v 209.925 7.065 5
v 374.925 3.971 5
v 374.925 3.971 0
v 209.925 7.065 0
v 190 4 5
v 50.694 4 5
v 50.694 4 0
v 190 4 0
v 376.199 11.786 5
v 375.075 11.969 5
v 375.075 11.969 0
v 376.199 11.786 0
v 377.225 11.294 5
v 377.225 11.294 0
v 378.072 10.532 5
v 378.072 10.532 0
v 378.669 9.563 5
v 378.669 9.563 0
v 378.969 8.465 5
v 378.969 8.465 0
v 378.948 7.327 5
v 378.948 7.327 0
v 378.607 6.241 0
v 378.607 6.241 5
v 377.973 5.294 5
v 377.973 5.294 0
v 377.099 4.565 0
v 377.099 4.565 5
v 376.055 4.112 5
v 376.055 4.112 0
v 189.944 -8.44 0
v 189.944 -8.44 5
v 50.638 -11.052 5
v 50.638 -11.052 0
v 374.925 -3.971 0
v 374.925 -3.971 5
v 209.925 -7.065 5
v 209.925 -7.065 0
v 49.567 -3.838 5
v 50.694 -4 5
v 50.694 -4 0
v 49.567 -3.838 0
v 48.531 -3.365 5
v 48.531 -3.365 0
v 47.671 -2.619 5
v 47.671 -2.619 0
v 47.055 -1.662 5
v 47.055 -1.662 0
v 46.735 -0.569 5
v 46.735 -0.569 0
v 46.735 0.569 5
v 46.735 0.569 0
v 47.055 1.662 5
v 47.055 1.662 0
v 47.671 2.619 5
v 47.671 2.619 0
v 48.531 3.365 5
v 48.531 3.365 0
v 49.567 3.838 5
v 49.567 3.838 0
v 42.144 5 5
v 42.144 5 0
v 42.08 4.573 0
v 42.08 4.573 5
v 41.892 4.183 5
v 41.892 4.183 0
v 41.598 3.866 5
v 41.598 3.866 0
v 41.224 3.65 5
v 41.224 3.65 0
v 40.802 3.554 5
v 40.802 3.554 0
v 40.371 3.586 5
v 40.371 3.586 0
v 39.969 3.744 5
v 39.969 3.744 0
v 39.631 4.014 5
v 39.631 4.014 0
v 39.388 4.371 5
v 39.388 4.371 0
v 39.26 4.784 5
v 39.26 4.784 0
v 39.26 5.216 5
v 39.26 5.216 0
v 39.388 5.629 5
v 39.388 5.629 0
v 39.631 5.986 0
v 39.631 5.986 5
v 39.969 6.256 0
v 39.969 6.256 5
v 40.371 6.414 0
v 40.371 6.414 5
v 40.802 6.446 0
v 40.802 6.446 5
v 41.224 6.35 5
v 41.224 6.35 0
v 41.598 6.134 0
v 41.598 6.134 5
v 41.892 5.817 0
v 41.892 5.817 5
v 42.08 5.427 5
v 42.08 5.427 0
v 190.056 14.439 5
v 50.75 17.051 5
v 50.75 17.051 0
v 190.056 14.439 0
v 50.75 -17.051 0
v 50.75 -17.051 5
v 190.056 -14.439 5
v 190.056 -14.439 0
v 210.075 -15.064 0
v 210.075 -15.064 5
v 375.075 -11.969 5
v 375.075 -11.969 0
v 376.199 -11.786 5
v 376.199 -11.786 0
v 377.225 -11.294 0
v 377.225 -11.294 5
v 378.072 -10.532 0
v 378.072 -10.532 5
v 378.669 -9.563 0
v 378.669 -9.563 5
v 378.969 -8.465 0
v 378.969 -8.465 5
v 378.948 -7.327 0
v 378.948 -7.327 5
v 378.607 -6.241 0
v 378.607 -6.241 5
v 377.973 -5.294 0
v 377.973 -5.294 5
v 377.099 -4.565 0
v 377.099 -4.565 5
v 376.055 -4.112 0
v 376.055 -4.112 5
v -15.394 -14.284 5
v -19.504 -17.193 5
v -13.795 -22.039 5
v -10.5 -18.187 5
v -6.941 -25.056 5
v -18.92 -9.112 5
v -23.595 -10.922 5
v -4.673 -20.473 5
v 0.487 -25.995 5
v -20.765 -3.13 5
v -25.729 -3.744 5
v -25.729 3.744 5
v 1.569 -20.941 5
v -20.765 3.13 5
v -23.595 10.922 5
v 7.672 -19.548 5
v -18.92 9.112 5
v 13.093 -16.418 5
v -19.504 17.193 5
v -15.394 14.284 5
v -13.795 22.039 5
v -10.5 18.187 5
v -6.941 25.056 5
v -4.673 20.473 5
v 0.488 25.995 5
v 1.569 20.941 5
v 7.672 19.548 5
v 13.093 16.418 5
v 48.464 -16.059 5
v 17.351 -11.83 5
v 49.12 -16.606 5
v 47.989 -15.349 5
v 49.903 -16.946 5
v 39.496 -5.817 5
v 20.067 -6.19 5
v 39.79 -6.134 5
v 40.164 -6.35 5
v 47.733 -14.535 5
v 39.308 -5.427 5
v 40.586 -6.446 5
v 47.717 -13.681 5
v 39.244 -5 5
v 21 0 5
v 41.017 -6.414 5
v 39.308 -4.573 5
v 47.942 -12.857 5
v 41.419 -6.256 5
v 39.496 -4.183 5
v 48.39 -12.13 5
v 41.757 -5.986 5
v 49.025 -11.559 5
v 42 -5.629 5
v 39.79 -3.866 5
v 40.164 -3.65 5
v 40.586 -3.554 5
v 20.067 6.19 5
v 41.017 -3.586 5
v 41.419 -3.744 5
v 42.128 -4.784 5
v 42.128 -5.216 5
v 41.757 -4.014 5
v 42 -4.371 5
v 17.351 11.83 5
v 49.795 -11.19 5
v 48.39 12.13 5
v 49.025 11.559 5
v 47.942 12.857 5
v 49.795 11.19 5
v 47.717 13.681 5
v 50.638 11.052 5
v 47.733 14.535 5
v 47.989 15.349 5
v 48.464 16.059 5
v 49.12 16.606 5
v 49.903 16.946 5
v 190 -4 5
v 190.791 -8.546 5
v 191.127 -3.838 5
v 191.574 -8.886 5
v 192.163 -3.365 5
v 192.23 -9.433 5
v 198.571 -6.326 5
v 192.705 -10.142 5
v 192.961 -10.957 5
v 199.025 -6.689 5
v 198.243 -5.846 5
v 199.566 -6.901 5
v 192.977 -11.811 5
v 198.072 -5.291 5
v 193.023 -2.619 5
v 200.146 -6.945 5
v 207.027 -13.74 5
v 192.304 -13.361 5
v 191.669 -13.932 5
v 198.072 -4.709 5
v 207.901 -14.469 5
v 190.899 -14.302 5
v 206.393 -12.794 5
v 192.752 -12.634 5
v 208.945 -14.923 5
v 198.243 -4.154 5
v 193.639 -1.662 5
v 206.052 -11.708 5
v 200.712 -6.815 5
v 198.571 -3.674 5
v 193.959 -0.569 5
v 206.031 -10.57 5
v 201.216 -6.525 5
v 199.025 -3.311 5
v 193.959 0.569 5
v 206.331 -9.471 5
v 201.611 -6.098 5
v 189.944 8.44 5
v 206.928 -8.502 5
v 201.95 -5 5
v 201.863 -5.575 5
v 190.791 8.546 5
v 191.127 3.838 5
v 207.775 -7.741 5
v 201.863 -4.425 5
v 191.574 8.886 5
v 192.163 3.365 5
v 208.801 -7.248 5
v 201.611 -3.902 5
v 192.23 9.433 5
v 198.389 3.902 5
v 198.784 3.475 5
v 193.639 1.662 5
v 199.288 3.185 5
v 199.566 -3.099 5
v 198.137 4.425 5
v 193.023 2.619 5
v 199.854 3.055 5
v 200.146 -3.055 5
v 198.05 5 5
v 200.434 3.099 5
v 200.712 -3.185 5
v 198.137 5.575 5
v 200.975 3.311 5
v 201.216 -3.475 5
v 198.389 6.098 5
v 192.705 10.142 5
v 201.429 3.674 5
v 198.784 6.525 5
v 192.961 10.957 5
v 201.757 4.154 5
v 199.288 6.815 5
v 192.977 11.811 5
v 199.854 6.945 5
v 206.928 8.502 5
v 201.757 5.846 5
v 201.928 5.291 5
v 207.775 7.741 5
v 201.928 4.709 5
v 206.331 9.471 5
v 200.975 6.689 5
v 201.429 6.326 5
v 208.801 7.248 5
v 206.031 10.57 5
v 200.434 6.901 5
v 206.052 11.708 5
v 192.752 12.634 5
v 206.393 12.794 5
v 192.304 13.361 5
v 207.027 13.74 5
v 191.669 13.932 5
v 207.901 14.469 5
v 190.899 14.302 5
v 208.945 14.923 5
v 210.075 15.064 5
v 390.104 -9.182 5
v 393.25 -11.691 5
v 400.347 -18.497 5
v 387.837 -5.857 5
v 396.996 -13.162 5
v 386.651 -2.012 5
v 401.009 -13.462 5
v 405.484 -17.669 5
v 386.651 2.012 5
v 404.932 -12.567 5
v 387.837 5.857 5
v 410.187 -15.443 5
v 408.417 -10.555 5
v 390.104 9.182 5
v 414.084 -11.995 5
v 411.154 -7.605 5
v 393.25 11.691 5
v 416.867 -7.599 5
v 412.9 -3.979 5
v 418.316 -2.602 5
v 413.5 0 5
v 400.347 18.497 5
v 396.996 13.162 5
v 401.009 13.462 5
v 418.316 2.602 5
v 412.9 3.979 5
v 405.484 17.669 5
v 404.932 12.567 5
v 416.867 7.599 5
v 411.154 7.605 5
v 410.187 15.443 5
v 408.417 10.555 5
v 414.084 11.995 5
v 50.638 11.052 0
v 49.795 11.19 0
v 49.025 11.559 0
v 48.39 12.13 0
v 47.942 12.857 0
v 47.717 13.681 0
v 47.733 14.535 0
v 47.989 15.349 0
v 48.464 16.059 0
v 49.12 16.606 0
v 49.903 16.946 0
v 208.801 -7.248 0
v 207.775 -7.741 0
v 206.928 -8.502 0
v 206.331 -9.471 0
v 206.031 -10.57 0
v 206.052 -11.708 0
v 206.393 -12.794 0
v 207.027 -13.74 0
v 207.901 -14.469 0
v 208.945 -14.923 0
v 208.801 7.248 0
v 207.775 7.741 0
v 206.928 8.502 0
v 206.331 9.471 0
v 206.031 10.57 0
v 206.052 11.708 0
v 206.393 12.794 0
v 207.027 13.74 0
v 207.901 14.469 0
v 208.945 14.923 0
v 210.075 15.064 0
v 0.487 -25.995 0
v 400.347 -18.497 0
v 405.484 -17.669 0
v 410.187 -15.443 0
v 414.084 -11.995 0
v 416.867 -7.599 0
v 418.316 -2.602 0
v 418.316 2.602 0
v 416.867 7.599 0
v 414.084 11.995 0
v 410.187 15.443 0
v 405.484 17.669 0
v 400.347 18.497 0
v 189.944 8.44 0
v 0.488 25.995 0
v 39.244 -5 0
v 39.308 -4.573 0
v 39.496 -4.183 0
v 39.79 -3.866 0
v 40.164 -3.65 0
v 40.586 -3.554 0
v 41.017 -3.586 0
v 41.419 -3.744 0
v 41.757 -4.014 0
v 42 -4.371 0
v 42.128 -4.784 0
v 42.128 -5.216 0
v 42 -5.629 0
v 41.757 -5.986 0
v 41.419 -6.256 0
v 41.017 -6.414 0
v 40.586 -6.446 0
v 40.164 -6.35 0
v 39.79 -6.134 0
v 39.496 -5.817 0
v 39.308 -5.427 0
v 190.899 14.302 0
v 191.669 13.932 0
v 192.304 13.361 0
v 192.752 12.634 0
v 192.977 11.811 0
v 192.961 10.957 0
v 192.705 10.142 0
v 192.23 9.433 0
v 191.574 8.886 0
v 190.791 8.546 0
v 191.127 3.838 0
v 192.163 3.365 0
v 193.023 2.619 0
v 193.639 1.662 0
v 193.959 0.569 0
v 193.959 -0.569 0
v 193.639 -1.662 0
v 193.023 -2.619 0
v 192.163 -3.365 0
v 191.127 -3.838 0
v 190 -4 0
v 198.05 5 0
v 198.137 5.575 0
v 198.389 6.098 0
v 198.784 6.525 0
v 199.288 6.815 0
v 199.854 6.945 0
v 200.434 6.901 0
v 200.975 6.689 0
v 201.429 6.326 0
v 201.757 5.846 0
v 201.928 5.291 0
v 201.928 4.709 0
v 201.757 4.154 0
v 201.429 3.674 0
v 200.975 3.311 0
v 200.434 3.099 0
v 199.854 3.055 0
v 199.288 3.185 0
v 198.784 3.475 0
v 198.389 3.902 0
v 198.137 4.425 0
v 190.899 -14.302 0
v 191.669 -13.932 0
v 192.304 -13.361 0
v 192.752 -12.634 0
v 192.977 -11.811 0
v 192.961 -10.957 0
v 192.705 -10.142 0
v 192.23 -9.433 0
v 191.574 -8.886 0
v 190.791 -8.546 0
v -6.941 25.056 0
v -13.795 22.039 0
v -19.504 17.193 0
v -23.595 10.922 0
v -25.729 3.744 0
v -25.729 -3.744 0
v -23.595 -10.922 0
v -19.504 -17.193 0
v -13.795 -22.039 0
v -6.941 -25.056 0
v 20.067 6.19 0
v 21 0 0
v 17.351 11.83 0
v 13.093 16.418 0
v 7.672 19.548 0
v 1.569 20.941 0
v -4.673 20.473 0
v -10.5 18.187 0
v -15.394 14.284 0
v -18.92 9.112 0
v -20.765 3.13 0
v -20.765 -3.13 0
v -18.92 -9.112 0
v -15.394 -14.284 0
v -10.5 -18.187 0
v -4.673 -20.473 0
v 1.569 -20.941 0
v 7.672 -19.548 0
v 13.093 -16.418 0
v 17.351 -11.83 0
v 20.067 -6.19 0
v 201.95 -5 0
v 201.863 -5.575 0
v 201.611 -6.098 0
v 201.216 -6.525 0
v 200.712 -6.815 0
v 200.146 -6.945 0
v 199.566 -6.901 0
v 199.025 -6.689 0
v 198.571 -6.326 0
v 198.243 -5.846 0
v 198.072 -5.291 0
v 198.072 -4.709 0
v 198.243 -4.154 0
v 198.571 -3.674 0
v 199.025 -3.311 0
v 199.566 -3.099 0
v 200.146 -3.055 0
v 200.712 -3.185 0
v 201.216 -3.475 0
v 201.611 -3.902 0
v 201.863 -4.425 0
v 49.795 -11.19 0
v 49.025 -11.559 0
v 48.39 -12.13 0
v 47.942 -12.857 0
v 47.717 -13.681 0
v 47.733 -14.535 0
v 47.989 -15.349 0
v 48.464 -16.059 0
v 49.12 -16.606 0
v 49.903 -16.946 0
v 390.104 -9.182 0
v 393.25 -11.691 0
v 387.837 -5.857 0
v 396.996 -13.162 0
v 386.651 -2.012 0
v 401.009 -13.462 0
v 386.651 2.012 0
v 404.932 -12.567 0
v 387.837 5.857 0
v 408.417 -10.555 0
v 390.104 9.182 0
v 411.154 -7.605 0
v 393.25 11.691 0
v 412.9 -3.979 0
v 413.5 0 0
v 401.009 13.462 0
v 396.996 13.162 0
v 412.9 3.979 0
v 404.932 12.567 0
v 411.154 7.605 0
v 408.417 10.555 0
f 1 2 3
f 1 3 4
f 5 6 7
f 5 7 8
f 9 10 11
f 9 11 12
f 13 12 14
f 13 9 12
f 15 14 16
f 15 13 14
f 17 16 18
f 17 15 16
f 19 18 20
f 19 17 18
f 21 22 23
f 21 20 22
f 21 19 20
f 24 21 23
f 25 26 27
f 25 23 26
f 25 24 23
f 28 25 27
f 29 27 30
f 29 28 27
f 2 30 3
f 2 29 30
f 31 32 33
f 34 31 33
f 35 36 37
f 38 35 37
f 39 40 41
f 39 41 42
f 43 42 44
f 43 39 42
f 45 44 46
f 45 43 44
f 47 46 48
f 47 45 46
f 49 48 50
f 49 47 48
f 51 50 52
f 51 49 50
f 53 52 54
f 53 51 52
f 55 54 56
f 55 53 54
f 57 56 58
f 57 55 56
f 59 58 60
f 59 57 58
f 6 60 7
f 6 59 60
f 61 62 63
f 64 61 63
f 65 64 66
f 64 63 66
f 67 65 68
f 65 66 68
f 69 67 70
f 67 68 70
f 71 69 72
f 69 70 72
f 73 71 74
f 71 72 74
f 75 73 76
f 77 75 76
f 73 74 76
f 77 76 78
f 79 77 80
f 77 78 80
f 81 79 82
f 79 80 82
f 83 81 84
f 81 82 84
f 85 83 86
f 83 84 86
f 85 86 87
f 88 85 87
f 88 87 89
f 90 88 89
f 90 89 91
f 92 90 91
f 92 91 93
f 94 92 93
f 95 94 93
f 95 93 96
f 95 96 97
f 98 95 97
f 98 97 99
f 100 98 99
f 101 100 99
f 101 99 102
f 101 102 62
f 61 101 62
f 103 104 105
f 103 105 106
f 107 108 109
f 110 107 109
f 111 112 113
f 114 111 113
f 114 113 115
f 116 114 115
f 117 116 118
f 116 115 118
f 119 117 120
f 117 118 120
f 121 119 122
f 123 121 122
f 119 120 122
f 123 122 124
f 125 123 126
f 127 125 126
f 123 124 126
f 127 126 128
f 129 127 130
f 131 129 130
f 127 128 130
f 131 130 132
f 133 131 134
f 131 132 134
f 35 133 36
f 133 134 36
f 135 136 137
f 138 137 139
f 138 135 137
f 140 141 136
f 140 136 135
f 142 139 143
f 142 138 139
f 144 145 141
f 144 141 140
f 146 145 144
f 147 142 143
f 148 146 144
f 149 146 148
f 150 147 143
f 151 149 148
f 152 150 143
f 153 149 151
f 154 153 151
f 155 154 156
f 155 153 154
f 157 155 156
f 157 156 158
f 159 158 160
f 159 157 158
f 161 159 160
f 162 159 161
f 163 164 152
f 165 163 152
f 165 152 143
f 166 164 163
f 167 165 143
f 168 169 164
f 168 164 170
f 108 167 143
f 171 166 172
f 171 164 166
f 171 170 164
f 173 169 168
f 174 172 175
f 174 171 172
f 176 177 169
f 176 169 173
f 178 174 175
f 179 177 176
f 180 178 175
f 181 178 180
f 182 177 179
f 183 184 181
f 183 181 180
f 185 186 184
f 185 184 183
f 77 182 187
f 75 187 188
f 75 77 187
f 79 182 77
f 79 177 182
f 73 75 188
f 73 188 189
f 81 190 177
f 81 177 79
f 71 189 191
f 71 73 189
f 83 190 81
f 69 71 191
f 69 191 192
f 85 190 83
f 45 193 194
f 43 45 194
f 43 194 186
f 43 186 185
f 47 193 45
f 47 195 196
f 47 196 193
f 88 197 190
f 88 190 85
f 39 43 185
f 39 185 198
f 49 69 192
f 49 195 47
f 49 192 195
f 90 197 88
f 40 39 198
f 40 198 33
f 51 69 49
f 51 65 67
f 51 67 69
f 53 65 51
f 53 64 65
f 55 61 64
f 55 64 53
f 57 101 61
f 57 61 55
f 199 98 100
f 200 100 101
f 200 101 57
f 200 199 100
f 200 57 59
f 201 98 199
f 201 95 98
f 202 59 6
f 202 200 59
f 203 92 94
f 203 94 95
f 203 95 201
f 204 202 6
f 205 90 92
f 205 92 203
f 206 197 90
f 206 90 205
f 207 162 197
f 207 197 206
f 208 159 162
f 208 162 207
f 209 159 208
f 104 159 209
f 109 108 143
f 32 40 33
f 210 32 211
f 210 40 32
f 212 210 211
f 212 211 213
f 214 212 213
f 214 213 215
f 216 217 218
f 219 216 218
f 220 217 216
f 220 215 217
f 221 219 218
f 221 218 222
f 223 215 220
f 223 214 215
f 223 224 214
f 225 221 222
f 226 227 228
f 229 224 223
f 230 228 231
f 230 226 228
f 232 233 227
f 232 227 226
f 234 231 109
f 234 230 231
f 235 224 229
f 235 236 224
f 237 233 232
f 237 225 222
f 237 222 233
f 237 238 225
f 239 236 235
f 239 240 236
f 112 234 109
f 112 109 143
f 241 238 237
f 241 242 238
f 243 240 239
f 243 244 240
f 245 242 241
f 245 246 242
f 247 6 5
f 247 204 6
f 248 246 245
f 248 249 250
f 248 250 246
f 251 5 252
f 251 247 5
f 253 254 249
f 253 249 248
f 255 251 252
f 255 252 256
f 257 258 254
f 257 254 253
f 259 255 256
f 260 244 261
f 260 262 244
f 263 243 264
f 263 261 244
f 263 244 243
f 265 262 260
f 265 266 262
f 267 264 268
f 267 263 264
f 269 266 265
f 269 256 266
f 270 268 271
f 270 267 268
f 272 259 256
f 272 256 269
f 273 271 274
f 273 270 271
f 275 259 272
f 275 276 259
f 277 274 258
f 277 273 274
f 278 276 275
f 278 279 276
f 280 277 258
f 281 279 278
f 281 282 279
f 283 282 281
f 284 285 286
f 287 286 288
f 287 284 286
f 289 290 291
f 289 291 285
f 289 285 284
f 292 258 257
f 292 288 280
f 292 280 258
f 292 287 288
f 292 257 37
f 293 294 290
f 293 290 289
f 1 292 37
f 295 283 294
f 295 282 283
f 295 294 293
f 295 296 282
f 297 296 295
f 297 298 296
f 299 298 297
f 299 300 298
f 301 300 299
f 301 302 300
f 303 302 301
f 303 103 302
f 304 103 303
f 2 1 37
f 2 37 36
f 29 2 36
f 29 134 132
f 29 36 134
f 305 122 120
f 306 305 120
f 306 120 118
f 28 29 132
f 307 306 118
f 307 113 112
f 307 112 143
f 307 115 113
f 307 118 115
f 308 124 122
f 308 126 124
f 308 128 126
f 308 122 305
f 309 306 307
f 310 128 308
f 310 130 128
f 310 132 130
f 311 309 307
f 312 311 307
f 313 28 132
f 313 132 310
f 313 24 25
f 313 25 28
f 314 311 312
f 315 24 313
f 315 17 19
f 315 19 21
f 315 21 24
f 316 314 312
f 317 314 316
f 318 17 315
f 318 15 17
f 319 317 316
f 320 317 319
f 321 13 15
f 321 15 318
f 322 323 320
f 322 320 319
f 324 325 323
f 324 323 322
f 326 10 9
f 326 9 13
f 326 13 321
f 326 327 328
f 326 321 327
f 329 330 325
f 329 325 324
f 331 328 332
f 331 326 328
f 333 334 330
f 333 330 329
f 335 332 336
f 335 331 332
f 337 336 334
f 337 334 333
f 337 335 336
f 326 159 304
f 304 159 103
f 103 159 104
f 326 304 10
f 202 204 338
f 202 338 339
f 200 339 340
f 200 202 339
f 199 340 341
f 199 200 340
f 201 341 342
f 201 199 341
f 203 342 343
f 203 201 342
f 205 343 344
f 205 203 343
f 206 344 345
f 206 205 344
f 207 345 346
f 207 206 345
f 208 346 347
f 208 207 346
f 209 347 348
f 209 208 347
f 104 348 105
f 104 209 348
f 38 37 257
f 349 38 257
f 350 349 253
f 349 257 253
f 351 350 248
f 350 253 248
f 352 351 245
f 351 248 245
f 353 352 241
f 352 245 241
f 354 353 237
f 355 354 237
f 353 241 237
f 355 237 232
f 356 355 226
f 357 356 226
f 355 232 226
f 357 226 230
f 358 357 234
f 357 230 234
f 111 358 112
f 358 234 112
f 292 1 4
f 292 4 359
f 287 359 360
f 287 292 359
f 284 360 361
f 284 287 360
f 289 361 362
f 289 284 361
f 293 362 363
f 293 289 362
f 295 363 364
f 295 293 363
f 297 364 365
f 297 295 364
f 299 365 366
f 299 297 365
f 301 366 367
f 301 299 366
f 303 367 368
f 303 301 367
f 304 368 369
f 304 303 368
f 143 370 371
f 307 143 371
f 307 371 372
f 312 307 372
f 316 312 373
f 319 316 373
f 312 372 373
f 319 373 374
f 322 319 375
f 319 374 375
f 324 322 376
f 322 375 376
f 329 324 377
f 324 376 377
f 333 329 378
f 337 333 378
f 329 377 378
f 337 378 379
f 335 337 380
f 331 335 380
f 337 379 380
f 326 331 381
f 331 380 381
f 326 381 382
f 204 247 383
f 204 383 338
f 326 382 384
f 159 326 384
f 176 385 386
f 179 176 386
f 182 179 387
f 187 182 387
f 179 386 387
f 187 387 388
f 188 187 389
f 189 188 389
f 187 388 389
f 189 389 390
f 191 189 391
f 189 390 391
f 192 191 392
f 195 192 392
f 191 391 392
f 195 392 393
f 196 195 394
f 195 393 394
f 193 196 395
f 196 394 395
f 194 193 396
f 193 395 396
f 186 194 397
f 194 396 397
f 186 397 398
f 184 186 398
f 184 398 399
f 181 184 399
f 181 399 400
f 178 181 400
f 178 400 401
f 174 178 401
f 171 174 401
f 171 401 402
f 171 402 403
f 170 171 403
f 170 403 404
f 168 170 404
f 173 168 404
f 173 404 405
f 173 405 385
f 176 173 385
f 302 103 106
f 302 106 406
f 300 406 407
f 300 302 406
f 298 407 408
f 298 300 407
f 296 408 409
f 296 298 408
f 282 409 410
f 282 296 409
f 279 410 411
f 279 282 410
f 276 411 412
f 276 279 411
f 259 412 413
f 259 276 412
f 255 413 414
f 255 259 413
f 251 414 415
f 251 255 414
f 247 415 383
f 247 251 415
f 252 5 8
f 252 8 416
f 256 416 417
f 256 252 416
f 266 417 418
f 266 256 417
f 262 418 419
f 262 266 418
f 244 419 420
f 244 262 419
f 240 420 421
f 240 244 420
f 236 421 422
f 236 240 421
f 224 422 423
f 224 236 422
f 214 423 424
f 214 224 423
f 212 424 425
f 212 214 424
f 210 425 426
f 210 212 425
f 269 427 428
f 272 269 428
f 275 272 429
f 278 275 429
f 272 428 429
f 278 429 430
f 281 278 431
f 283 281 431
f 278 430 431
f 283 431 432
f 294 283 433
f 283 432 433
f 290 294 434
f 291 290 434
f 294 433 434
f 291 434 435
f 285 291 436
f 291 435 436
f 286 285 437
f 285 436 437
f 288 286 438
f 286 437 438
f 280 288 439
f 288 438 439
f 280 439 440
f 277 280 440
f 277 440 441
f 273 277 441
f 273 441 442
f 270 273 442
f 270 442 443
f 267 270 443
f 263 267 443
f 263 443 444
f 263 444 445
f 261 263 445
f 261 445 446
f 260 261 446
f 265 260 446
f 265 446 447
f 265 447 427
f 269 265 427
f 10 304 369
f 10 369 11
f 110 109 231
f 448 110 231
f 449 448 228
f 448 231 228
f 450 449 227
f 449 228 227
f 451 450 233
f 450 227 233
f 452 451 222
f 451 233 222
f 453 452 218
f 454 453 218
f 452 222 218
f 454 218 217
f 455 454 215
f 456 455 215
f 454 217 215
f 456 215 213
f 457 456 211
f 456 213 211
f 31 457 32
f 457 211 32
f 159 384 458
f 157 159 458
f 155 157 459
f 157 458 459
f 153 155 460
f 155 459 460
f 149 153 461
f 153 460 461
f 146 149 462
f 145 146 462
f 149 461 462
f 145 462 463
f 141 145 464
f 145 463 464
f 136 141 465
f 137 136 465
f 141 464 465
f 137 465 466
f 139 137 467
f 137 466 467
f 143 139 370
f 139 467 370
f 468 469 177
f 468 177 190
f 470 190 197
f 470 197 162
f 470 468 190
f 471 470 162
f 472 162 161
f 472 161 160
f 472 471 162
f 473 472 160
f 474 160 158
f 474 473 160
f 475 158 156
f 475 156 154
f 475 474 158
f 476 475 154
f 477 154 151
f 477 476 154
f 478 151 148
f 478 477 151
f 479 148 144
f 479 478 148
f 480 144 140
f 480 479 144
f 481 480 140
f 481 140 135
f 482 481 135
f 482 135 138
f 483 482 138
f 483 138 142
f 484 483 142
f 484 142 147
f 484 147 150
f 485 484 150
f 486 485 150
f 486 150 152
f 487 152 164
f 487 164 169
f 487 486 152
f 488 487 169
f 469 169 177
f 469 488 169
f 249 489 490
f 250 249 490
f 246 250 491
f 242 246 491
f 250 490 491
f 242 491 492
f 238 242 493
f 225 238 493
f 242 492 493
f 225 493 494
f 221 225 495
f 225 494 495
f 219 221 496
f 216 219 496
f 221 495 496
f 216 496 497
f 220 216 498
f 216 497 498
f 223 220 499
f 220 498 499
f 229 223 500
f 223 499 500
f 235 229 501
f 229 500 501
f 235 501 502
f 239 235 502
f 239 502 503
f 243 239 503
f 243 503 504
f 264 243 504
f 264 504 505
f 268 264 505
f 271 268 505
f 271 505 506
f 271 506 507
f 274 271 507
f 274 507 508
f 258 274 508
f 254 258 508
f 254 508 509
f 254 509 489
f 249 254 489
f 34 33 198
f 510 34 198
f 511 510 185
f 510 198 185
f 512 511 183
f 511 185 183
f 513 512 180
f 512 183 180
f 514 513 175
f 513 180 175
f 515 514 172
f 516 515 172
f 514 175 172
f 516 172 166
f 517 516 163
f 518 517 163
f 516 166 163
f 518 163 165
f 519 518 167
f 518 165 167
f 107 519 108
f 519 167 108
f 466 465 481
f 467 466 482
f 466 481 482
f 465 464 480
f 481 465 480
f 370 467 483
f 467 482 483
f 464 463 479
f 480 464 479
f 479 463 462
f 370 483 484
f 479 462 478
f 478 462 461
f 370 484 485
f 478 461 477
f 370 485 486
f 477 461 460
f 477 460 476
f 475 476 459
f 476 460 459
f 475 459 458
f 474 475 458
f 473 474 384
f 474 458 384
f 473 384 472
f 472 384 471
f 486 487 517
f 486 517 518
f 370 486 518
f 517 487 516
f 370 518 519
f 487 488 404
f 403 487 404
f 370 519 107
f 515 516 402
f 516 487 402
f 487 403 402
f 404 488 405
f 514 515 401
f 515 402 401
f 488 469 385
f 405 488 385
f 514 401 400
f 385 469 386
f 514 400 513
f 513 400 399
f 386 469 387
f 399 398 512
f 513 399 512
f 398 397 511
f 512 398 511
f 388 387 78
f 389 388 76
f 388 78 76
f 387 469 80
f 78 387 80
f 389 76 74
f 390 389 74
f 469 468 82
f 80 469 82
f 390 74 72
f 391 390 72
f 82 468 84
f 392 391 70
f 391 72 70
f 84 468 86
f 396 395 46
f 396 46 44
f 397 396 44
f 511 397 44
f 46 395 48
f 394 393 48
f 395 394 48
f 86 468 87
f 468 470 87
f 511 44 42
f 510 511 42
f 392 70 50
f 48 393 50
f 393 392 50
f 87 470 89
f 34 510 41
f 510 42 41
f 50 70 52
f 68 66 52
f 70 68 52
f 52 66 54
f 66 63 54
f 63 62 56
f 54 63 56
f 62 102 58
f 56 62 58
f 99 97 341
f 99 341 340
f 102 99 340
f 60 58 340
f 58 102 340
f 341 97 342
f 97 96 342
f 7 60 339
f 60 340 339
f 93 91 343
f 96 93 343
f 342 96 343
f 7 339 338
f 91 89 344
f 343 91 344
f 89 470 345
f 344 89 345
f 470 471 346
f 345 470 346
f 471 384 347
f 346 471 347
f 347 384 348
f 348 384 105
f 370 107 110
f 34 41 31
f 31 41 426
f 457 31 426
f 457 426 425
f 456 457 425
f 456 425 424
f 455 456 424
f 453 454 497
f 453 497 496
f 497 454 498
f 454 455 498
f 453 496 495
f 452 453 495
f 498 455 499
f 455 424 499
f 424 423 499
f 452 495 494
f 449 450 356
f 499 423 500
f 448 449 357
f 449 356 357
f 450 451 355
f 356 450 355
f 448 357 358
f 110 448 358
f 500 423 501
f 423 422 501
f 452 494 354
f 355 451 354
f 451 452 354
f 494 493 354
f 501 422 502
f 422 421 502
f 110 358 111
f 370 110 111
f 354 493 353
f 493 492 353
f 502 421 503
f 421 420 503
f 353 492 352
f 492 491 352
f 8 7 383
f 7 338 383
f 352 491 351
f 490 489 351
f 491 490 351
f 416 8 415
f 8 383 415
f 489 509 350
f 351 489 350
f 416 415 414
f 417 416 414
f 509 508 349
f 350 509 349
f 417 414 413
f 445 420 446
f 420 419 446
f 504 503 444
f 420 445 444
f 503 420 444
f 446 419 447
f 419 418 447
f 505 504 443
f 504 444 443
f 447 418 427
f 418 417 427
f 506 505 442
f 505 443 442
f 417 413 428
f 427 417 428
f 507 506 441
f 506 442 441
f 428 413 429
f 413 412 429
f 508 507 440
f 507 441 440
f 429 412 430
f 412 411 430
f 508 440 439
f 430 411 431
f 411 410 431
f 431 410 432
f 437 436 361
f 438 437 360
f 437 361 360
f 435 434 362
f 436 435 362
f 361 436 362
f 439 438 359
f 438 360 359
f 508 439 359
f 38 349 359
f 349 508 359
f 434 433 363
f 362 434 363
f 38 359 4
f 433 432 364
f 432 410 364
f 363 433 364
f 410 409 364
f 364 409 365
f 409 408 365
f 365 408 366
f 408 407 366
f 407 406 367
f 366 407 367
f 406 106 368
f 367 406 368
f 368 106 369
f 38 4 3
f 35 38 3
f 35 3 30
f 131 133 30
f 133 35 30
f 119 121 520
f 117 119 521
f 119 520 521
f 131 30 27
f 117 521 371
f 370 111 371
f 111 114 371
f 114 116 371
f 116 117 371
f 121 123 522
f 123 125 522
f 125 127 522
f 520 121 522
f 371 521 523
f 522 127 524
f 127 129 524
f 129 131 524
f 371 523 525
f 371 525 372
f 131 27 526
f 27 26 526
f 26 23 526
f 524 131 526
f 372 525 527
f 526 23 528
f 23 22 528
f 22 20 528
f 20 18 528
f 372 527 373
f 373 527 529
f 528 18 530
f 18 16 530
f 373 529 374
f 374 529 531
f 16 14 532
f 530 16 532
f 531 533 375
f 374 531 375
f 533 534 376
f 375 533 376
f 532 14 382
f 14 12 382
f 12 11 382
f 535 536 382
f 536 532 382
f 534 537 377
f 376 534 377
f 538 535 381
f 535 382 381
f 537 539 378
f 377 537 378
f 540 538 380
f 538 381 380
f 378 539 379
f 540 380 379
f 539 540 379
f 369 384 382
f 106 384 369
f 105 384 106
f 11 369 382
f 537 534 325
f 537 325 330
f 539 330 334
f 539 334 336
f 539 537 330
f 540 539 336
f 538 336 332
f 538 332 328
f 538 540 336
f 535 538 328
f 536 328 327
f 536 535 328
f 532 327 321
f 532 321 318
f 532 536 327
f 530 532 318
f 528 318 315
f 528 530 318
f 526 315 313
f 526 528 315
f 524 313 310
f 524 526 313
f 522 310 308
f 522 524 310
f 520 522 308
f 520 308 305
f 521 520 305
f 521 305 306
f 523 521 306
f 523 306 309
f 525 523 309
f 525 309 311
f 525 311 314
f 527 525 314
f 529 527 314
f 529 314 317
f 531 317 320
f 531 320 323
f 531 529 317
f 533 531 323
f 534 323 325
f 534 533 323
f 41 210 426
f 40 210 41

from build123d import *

# Parameters (mm, degrees)
SKETCH_1_R          = 21
SKETCH_1_R_2        = 13.5
EXTRUDE_1_DEPTH     = 5
SKETCH_4_R          = 1.45
CUT_EXTRUDE_1_DEPTH = 420.336678577
SKETCH_5_R          = 1.95
CUT_EXTRUDE_2_DEPTH = 420.336678577
CUT_EXTRUDE_3_DEPTH = 420.336678577


with BuildPart() as part:
    # 草图1 → 凸台-拉伸1 (new body)
    with BuildSketch(Plane.XY):
        with BuildLine():
            Line((400.346875, 18.496747761), (0.4875, 25.995429286))
            ThreePointArc((0.4875, 25.995429286), (-26, 0), (0.4875, -25.995429286))
            Line((0.4875, -25.995429286), (400.346875, -18.496747761))
            ThreePointArc((400.346875, -18.496747761), (418.5, 0), (400.346875, 18.496747761))
        make_face()
        Circle(SKETCH_1_R, mode=Mode.SUBTRACT)
        with Locations((400, 0)):
            Circle(SKETCH_1_R_2, mode=Mode.SUBTRACT)
    extrude(amount=EXTRUDE_1_DEPTH)

    # 草图4 → 切除-拉伸1 (cut, through all)
    with BuildSketch(Plane(origin=(0, 0, 0), x_dir=(-1, 0, 0), z_dir=(0, 0, -1))):
        with Locations((-40.693979899, -5)):
            Circle(SKETCH_4_R)
        with Locations(Location((-40.693979899, 5, 0), (0, 0, 180))):
            Circle(SKETCH_4_R)
    extrude(amount=-CUT_EXTRUDE_1_DEPTH, mode=Mode.SUBTRACT)

    # 草图5 → 切除-拉伸2 (cut, through all)
    with BuildSketch(Plane(origin=(0, 0, 0), x_dir=(-1, 0, 0), z_dir=(0, 0, -1))):
        with Locations((-200, 5)):
            Circle(SKETCH_5_R)
        with Locations(Location((-200, -5, 0), (0, 0, 180))):
            Circle(SKETCH_5_R)
    extrude(amount=-CUT_EXTRUDE_2_DEPTH, mode=Mode.SUBTRACT)

    # 草图6 → 切除-拉伸3 (cut, through all)
    with BuildSketch(Plane.XY.offset(5)):
        with BuildLine():
            Line((50.750229899, 17.051430775), (190.05625, 14.438983638))
            ThreePointArc((190.05625, 14.438983638), (192.99947261, 11.383261028), (189.94375, 8.440038418))
            Line((189.94375, 8.440038418), (50.637729899, 11.052485555))
            ThreePointArc((50.637729899, 11.052485555), (47.694507289, 14.108208165), (50.750229899, 17.051430775))
        make_face()
        with BuildLine():
            Line((210.075, 15.063741906), (375.075, 11.969447939))
            ThreePointArc((375.075, 11.969447939), (378.999296813, 7.895151126), (374.925, 3.970854313))
            Line((374.925, 3.970854313), (209.925, 7.06514828))
            ThreePointArc((209.925, 7.06514828), (206.000703187, 11.139445093), (210.075, 15.063741906))
        make_face()
        with BuildLine():
            Line((210.075, -15.063741906), (375.075, -11.969447939))
            ThreePointArc((375.075, -11.969447939), (378.999296813, -7.895151126), (374.925, -3.970854313))
            Line((374.925, -3.970854313), (209.925, -7.06514828))
            ThreePointArc((209.925, -7.06514828), (206.000703187, -11.139445093), (210.075, -15.063741906))
        make_face()
        with BuildLine():
            Line((50.750229899, -17.051430775), (190.05625, -14.438983638))
            ThreePointArc((190.05625, -14.438983638), (192.99947261, -11.383261028), (189.94375, -8.440038418))
            Line((189.94375, -8.440038418), (50.637729899, -11.052485555))
            ThreePointArc((50.637729899, -11.052485555), (47.694507289, -14.108208165), (50.750229899, -17.051430775))
        make_face()
        with BuildLine():
            Line((50.693979899, 4), (190, 4))
            ThreePointArc((190, 4), (194, 0), (190, -4))
            Line((190, -4), (50.693979899, -4))
            ThreePointArc((50.693979899, -4), (46.693979899, 0), (50.693979899, 4))
        make_face()
    extrude(amount=-CUT_EXTRUDE_3_DEPTH, mode=Mode.SUBTRACT)


solid = part.part
